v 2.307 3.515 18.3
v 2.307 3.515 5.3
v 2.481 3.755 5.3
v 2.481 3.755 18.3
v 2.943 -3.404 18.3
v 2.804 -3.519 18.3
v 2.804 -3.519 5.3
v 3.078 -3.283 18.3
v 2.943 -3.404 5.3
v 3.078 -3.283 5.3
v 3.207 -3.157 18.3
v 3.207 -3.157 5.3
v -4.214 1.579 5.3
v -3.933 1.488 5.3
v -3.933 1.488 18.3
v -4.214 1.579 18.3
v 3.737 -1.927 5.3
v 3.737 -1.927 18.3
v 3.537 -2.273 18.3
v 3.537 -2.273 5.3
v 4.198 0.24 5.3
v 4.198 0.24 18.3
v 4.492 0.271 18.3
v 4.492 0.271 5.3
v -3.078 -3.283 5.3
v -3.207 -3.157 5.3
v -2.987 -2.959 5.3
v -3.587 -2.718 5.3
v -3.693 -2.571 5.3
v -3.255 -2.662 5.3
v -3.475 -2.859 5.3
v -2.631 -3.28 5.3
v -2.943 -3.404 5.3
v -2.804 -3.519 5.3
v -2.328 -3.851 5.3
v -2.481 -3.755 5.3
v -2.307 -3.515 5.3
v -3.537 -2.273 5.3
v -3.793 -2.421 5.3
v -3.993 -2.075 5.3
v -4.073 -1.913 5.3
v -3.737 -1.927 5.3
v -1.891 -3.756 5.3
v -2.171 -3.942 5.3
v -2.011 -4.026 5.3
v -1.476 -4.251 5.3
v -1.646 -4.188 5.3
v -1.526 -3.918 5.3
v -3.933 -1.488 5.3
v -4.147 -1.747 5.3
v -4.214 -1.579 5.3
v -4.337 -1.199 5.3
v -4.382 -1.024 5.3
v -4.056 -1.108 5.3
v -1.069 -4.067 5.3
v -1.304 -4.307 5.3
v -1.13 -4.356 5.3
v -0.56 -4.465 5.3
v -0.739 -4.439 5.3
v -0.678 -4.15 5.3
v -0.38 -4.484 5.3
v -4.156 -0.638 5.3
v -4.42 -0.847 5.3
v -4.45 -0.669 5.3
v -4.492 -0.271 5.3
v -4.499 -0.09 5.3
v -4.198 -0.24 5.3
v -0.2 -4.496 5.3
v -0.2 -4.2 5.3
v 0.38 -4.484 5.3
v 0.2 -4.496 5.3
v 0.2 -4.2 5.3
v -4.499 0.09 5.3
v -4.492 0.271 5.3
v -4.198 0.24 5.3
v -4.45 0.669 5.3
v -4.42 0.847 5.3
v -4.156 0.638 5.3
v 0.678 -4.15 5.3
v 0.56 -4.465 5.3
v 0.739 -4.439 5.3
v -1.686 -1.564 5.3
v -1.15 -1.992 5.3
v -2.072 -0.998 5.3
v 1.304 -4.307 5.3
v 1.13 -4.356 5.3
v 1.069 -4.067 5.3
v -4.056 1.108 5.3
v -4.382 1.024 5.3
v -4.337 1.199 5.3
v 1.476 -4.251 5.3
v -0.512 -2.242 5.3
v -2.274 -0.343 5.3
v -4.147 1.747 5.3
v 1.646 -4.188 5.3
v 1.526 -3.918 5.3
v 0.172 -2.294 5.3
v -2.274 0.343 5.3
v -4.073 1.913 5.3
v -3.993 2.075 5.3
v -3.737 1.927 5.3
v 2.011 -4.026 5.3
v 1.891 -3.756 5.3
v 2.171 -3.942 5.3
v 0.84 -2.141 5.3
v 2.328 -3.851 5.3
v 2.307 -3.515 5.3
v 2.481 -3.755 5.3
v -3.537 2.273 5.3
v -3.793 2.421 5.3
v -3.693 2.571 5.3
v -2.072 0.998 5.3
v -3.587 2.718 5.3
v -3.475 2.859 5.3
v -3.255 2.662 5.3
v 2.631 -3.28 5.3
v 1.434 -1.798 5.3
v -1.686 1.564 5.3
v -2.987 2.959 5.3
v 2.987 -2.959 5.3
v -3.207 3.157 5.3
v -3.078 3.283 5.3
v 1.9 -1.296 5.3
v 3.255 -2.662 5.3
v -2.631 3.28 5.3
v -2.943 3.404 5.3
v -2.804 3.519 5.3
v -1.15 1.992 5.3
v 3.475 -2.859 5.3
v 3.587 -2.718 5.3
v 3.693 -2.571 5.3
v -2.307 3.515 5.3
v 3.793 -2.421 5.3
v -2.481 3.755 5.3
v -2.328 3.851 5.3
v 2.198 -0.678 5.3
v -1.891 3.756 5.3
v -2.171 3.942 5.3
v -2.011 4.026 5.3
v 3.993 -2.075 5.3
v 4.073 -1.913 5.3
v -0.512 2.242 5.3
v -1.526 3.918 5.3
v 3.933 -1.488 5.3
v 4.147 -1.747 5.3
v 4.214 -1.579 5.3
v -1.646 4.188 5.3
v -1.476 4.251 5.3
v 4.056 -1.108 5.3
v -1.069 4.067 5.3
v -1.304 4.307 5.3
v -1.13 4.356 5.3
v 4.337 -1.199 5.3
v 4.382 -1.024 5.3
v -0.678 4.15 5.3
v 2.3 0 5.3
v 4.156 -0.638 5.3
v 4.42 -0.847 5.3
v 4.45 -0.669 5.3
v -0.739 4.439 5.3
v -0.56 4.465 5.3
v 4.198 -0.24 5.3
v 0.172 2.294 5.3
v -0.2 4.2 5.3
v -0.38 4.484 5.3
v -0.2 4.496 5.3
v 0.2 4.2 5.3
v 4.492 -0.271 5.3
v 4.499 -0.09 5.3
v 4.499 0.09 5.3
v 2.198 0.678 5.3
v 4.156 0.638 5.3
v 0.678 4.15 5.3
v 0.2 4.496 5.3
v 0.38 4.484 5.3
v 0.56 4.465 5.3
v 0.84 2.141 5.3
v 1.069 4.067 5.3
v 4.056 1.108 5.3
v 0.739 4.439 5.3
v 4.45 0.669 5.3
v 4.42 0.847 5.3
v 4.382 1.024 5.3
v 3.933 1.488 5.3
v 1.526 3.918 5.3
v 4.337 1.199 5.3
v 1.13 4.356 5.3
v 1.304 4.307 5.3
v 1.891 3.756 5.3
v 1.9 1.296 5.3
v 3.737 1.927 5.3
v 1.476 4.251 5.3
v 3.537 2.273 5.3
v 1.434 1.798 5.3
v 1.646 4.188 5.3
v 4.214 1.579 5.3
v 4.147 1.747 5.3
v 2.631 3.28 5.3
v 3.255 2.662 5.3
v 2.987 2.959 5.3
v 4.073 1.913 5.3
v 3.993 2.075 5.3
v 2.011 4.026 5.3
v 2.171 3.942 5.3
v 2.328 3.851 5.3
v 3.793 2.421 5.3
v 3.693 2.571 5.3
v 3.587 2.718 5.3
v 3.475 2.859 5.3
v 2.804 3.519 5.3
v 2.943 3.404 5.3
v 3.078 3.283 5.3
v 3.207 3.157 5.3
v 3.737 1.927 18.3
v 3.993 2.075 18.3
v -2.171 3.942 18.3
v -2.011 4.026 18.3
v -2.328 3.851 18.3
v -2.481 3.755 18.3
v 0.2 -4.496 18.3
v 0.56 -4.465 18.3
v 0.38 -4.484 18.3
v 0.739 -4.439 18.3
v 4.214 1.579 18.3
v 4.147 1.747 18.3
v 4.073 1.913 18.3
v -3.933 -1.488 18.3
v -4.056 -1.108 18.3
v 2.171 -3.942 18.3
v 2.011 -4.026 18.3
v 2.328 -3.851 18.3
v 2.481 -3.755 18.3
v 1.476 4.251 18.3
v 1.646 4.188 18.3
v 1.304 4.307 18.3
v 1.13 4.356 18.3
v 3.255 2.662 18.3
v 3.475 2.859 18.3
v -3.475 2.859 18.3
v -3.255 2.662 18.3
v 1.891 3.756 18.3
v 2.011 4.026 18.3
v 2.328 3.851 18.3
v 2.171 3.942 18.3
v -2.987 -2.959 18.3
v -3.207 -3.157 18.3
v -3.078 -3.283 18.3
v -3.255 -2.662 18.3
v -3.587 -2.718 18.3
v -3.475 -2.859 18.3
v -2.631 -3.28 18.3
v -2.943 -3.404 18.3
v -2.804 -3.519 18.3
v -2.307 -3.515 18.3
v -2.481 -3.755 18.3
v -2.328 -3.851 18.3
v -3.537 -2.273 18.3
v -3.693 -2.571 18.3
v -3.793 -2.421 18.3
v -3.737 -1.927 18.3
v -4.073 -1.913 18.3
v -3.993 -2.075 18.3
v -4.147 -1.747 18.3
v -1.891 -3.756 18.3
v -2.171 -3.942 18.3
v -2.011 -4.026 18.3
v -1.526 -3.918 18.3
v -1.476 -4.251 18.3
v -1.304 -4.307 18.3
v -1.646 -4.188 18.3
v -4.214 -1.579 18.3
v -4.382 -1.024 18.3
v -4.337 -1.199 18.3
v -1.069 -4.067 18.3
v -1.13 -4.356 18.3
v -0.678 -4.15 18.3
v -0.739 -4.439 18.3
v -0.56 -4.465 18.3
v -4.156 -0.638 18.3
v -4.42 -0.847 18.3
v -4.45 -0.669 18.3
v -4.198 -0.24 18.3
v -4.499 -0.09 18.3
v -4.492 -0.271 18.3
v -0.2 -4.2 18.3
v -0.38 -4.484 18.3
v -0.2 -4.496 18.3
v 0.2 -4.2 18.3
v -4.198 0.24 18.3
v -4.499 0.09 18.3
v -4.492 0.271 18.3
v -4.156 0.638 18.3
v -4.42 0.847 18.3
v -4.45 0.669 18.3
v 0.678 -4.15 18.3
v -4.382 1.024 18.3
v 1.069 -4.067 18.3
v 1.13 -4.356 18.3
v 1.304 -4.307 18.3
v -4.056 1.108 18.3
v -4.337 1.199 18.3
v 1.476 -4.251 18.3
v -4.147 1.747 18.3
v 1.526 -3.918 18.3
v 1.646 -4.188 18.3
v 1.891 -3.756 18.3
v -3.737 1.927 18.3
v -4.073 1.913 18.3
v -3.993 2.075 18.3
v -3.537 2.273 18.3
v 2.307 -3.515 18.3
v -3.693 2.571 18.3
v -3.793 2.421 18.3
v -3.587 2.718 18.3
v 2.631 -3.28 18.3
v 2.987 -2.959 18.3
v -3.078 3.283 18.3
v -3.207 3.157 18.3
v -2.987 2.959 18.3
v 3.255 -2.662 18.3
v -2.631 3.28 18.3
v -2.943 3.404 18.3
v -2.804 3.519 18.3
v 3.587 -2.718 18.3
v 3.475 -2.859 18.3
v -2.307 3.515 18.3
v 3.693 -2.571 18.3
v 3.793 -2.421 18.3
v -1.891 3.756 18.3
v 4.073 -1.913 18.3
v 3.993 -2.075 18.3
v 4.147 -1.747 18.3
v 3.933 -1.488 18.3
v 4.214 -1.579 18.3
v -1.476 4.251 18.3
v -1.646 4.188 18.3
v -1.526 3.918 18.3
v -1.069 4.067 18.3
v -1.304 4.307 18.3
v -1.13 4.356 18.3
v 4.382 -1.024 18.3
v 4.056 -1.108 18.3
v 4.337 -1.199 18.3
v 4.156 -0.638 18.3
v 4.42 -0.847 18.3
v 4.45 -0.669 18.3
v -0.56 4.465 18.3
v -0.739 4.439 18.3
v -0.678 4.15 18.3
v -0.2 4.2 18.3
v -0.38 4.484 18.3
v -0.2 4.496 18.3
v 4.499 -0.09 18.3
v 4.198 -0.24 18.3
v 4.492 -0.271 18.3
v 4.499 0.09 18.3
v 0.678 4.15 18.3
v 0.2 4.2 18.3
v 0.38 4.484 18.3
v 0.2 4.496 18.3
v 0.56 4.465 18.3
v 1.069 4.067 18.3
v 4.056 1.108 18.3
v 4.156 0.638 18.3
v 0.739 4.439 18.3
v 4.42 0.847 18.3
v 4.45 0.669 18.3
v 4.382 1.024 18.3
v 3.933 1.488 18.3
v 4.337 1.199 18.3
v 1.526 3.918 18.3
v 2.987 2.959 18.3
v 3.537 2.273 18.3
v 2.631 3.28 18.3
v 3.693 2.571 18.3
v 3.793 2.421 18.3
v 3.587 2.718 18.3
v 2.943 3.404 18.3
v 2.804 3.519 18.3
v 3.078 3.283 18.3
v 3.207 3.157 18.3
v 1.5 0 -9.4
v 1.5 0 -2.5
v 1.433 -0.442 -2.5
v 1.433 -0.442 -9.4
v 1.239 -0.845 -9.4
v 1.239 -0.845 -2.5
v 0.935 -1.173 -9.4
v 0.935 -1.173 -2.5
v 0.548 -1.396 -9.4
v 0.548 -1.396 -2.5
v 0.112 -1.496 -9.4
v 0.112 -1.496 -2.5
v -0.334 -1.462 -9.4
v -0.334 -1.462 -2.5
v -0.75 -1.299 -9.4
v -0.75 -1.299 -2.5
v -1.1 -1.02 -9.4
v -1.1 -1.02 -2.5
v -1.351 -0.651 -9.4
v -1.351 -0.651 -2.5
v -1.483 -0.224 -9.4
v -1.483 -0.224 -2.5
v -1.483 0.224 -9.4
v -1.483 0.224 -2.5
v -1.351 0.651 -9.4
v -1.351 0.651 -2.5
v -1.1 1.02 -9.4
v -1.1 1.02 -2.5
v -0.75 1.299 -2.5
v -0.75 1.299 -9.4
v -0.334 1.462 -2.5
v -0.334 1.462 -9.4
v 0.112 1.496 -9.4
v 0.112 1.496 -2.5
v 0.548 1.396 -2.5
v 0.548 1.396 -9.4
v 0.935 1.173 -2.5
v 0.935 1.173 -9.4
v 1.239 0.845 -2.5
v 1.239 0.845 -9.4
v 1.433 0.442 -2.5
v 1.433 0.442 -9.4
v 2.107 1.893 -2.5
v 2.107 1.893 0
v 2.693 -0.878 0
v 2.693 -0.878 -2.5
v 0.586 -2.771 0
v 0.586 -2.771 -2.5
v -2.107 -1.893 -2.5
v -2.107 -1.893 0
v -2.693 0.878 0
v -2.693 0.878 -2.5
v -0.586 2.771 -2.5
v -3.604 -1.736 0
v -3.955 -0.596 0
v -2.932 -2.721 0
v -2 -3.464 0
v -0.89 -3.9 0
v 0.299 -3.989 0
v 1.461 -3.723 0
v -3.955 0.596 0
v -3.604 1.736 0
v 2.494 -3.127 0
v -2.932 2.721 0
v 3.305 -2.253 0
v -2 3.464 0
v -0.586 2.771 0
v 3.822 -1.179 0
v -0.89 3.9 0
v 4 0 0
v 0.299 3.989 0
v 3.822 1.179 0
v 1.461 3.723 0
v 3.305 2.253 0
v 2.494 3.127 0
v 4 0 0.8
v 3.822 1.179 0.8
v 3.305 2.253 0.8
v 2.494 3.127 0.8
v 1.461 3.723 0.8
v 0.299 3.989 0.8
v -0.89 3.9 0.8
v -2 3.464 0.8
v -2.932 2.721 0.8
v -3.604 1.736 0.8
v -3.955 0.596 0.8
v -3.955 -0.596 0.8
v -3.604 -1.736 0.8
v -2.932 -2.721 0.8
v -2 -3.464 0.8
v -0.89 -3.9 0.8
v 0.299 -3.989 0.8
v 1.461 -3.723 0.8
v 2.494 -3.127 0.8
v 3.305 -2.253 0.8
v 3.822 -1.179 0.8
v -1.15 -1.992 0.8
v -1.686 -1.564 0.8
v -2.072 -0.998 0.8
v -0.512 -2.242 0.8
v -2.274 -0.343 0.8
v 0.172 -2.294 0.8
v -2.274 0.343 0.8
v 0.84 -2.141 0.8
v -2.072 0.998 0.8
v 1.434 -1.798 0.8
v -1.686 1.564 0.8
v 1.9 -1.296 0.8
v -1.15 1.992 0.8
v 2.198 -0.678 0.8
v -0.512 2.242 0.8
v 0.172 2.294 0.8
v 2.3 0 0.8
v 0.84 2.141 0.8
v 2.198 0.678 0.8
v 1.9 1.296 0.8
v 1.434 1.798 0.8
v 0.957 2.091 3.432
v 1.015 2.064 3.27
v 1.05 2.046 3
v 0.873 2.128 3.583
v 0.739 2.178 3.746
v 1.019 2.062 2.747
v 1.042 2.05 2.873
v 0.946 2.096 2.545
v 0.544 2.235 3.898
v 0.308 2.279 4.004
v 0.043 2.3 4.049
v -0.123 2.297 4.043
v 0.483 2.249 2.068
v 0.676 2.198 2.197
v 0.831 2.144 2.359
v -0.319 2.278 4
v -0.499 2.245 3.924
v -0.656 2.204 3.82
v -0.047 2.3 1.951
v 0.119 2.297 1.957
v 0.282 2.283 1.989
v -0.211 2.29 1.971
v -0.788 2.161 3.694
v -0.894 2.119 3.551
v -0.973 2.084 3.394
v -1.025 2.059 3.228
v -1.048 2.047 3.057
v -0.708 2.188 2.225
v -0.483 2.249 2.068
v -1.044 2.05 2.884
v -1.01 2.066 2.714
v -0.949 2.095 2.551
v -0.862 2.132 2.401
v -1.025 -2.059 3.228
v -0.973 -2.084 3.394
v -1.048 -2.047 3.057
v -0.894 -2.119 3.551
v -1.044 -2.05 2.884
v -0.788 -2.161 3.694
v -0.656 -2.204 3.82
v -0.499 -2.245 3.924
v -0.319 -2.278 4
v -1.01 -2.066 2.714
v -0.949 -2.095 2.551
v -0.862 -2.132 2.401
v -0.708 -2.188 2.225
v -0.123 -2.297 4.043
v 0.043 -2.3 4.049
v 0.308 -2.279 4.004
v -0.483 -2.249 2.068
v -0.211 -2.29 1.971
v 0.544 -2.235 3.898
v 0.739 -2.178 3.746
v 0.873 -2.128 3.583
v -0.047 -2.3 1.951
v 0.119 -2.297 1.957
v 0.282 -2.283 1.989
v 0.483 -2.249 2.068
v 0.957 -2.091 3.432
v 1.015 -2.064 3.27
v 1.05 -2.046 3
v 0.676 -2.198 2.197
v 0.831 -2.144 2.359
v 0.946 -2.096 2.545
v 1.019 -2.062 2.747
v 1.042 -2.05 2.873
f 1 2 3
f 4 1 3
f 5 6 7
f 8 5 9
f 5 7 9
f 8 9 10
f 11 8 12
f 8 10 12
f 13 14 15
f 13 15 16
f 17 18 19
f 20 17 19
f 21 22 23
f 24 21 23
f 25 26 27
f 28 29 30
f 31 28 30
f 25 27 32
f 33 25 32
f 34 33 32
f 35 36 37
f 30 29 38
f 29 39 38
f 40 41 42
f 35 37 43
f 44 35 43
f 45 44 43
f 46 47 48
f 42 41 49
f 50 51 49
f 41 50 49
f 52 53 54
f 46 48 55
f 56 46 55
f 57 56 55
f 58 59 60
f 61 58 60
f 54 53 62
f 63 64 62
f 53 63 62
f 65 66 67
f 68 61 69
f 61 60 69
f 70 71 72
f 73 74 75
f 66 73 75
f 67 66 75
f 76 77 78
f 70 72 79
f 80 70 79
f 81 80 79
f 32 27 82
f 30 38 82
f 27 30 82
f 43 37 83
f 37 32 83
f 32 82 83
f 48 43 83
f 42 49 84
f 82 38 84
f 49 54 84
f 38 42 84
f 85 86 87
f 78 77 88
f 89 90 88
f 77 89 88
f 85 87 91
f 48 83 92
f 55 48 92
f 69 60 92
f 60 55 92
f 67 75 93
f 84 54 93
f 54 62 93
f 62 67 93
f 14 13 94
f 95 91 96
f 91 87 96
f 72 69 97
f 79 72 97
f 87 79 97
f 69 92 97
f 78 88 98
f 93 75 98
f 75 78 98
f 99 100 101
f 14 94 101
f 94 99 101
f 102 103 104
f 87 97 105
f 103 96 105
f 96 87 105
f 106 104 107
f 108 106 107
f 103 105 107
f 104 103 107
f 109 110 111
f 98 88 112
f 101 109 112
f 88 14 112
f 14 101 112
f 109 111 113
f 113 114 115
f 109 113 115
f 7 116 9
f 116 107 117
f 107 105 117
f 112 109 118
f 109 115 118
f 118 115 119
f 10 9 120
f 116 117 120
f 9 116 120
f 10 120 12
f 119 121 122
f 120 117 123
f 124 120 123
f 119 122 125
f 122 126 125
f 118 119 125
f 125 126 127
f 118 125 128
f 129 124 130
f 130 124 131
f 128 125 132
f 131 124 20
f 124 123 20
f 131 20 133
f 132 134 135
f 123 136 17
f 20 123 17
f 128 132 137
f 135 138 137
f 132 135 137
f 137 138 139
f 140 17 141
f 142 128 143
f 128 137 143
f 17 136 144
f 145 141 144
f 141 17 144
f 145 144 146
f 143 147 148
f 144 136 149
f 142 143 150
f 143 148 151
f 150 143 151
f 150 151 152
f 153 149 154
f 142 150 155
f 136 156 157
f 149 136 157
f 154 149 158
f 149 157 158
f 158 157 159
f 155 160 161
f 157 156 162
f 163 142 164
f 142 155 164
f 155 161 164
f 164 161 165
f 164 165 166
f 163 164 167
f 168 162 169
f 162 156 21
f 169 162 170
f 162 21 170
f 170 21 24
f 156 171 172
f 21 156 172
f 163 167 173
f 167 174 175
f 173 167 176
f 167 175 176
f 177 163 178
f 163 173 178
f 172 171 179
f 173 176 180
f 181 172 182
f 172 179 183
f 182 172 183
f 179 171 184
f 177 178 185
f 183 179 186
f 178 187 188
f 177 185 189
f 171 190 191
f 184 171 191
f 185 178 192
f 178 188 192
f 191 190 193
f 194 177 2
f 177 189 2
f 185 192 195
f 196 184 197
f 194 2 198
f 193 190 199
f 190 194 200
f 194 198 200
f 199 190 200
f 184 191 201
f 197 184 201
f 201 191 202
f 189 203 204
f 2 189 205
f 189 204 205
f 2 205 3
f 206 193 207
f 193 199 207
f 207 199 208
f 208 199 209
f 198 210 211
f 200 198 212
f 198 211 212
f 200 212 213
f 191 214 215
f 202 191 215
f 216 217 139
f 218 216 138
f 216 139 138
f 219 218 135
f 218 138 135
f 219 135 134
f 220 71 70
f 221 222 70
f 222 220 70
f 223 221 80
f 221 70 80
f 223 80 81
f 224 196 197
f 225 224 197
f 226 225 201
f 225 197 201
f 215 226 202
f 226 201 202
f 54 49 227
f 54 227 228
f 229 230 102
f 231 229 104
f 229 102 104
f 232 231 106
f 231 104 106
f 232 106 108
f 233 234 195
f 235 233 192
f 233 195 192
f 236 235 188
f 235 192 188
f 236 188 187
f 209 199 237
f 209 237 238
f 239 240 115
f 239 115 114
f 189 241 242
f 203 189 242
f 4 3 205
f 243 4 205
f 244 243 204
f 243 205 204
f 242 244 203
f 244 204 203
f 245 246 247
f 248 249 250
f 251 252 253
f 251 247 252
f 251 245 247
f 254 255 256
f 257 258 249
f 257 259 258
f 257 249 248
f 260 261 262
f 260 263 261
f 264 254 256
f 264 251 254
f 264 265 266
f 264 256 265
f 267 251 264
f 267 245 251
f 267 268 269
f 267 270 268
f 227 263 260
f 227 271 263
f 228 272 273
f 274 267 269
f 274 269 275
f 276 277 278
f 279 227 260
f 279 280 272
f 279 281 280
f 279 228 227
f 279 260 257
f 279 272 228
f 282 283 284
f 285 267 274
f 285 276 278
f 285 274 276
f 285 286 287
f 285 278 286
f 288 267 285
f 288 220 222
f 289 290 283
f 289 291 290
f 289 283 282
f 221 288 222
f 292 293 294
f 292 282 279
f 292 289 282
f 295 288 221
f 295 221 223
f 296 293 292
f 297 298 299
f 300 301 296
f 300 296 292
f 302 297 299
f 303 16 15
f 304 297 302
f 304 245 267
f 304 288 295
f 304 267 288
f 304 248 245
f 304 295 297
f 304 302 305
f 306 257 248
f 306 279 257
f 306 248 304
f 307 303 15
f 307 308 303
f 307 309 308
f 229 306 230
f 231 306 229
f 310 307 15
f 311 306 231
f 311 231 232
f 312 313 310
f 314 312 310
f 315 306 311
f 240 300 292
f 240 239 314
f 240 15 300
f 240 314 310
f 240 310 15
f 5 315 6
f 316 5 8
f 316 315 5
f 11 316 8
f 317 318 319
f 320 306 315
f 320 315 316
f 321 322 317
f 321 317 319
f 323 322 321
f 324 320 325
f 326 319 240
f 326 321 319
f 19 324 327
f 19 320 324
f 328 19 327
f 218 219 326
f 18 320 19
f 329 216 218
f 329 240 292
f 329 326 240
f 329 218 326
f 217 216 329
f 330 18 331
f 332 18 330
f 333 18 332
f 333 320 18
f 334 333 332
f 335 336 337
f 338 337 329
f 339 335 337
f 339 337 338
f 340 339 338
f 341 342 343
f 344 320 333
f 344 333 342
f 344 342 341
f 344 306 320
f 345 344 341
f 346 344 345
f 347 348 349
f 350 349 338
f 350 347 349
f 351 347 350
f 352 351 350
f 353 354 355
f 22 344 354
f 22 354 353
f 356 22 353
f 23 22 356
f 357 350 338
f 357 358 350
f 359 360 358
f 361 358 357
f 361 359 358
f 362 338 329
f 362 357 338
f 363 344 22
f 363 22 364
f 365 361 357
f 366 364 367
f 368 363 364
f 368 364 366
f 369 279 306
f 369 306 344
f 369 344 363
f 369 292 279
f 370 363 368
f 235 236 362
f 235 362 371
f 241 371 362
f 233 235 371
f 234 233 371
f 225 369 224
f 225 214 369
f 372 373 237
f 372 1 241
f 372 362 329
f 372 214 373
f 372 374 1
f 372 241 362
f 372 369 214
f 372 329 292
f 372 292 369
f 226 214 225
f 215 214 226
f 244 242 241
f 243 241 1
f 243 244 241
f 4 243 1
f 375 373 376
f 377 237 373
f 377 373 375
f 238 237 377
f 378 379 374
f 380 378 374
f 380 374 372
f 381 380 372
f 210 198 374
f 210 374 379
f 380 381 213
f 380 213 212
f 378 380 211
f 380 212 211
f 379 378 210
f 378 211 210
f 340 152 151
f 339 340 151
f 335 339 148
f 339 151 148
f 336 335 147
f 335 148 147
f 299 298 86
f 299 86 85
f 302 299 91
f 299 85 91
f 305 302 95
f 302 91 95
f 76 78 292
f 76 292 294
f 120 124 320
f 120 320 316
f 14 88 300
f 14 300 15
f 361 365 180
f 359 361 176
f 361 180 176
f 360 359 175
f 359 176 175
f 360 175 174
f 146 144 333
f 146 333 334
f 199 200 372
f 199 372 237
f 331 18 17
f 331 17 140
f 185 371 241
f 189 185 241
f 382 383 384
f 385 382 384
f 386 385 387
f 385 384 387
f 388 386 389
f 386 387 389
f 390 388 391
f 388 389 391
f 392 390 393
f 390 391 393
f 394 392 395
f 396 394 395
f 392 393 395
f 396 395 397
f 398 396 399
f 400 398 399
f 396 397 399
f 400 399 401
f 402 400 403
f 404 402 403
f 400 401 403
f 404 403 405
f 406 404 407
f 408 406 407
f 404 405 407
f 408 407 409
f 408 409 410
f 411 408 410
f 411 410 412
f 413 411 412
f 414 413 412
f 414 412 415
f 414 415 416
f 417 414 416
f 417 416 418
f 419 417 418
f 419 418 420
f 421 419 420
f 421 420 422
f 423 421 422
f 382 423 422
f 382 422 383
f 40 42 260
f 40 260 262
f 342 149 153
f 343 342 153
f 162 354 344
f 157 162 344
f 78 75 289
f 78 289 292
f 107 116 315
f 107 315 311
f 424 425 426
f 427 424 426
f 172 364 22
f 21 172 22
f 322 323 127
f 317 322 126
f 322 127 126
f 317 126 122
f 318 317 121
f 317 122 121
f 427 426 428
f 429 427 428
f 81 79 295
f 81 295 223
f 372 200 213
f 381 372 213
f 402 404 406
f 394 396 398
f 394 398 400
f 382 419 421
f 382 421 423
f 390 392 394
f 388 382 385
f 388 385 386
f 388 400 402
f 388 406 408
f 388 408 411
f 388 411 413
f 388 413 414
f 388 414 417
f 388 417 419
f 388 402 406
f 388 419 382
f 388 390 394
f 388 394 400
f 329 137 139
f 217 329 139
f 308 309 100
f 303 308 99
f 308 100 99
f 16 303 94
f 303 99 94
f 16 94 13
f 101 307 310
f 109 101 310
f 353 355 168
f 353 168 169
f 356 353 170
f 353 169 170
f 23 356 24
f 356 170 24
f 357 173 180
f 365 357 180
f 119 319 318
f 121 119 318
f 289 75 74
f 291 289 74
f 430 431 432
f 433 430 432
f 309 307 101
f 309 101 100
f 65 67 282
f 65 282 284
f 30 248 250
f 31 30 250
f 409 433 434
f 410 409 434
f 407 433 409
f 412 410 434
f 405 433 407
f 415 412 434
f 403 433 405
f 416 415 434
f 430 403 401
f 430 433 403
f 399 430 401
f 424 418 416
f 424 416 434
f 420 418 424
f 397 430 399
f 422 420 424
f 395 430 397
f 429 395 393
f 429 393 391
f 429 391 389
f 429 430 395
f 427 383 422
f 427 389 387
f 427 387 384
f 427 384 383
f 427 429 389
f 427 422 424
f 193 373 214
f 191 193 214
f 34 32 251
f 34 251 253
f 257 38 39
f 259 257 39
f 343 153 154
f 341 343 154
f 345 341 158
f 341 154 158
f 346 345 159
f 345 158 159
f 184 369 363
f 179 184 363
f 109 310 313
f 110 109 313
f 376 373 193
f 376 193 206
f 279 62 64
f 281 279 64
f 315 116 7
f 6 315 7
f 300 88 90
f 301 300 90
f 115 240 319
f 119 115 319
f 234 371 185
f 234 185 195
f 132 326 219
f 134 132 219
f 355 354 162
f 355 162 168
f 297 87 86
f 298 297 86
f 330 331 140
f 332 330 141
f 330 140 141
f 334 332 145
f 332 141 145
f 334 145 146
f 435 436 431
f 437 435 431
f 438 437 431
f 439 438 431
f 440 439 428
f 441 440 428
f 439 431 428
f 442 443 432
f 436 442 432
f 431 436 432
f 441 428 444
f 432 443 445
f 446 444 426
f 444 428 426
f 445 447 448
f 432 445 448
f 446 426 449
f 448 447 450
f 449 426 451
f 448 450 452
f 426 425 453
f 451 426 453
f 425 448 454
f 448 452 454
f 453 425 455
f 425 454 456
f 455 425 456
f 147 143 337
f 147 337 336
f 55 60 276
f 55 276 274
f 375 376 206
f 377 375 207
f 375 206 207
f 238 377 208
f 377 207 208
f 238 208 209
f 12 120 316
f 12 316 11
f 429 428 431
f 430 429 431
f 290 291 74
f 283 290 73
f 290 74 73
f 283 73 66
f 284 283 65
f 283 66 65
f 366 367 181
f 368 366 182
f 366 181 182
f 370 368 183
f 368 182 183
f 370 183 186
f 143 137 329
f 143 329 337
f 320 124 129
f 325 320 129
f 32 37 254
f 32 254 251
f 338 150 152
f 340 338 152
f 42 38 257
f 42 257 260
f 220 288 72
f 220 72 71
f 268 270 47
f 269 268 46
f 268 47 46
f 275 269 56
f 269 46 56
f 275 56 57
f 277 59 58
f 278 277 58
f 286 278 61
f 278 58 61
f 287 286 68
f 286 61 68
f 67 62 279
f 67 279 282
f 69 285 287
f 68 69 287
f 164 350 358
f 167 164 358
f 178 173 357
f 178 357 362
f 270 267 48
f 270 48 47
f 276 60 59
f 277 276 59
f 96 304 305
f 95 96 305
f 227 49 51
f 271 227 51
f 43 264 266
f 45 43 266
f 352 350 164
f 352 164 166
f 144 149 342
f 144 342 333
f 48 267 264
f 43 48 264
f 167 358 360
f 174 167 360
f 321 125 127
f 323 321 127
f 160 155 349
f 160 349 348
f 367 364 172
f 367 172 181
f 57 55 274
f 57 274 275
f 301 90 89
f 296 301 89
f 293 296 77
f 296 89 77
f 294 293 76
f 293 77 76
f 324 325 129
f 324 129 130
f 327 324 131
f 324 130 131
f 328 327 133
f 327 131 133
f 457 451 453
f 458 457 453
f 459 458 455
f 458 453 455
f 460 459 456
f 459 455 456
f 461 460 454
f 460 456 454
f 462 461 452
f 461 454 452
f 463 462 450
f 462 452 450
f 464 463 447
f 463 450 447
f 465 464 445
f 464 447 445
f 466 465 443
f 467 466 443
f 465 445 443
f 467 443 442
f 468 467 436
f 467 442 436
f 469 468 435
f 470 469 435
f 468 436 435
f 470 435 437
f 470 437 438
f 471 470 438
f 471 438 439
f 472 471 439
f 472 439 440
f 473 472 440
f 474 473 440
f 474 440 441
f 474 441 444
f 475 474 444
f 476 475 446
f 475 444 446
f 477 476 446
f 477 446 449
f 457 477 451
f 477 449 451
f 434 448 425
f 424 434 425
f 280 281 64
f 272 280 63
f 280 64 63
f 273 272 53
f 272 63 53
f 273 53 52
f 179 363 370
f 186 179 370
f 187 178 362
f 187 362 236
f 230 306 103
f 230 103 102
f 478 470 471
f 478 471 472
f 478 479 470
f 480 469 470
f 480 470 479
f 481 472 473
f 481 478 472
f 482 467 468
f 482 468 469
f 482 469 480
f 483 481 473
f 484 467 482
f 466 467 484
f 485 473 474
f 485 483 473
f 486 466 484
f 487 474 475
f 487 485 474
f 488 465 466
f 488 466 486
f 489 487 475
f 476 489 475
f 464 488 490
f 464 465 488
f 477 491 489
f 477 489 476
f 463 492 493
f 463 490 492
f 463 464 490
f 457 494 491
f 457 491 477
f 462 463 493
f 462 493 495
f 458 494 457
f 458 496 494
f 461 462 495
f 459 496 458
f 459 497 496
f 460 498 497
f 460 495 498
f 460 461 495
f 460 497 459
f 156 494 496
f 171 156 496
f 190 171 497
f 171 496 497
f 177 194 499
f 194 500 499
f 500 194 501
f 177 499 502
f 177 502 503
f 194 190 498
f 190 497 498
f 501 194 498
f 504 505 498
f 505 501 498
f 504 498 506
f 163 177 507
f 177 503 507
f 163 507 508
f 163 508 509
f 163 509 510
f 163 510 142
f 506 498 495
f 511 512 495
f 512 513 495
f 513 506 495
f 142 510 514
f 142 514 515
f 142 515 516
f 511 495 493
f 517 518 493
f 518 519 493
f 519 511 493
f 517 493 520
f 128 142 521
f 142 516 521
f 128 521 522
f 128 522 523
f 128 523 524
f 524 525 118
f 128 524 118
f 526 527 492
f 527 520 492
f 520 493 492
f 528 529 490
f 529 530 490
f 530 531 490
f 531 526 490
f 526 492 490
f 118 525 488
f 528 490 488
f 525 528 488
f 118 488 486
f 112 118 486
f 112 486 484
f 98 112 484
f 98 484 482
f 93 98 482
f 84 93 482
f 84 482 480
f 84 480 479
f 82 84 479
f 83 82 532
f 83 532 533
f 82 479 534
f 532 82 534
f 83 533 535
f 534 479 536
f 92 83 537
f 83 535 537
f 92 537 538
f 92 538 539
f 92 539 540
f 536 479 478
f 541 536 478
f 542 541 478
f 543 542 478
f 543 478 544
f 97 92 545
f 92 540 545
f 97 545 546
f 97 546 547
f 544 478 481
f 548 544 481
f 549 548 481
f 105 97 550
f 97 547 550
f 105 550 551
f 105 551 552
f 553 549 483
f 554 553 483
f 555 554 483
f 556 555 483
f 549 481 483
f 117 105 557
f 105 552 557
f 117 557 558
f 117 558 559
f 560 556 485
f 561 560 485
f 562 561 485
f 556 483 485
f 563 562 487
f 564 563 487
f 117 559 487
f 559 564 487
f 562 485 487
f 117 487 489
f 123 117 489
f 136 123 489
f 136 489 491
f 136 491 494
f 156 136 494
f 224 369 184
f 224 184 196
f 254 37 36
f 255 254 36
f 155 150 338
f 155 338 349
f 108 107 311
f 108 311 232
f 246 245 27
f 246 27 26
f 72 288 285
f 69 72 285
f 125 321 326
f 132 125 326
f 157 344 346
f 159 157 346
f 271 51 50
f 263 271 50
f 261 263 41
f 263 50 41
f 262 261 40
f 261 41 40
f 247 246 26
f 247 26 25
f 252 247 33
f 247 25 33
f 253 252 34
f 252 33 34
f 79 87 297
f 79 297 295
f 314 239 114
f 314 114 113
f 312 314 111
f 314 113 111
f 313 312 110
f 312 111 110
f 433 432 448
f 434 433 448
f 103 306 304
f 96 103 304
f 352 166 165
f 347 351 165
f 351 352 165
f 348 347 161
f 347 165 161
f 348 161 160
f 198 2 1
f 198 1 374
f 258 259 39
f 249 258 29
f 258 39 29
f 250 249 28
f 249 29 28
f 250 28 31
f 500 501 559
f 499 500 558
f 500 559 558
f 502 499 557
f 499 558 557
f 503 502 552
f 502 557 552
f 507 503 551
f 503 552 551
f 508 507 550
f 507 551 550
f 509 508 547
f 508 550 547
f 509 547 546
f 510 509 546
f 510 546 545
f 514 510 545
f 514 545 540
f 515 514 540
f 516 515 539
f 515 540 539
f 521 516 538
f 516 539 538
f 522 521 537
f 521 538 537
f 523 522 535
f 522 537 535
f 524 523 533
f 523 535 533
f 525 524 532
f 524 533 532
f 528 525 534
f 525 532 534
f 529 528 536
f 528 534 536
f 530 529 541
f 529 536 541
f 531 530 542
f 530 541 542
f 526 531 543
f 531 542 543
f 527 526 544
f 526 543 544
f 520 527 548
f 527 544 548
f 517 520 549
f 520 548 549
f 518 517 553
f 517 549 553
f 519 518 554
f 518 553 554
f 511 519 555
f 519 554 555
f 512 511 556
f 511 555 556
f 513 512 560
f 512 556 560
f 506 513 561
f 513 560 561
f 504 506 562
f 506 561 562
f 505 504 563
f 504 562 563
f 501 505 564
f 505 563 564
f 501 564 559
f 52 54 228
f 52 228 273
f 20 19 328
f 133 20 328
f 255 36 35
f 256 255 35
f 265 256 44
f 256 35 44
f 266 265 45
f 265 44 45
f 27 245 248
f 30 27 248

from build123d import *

# Parameters (mm, degrees)
F0_R      = 4
F1_DEPTH  = 0.8
F2_R      = 2.3
F3_DEPTH  = 4.5
F4_R      = 4.5
F5_DEPTH  = 13
F6_R      = 1.5
F7_DEPTH  = 9.4
F8_R      = 1.05
F9_DEPTH  = 12.5
F10_W     = 0.4
F10_H     = 0.6
F11_DEPTH = 25
F12_COUNT = 30
F15_DEPTH = 2.5


with BuildPart() as f1:
    # F0 (on Top) → F1 (new body)
    with BuildSketch(Plane.XY):
        Circle(F0_R)
    extrude(amount=F1_DEPTH)

    # F2 (on face) → F3 (join)
    with BuildSketch(Plane.XY.offset(0.8)):
        Circle(F2_R)
    extrude(amount=F3_DEPTH)

    # F4 (on face) → F5 (join)
    with BuildSketch(Plane.XY.offset(5.3)):
        Circle(F4_R)
    extrude(amount=F5_DEPTH)

    # F6 (on face) → F7 (join)
    with BuildSketch(Plane(origin=(0, 0, 0), x_dir=(1, 0, 0), z_dir=(0, 0, -1))):
        Circle(F6_R)
    extrude(amount=F7_DEPTH)

    # F8 (on Front) → F9 (cut, symmetric)
    with BuildSketch(Plane.XZ):
        with Locations((0, 3)):
            Circle(F8_R)
    extrude(amount=F9_DEPTH, both=True, mode=Mode.SUBTRACT)


with BuildPart() as f11:
    # F10 (on face) → F11 (new body)
    with BuildSketch(Plane.XY.offset(18.3)):
        with Locations((0, 4.5)):
            Rectangle(F10_W, F10_H)
    extrude(amount=-F11_DEPTH)


with BuildPart() as f12_1:
    # F12: instance of F11
    add(f11.part.rotate(Axis((0, 0, 18.3), (0, 0, 1)), 1 * 360 / F12_COUNT))


with BuildPart() as f12_2:
    # F12: instance of F11
    add(f11.part.rotate(Axis((0, 0, 18.3), (0, 0, 1)), 2 * 360 / F12_COUNT))


with BuildPart() as f12_3:
    # F12: instance of F11
    add(f11.part.rotate(Axis((0, 0, 18.3), (0, 0, 1)), 3 * 360 / F12_COUNT))


with BuildPart() as f12_4:
    # F12: instance of F11
    add(f11.part.rotate(Axis((0, 0, 18.3), (0, 0, 1)), 4 * 360 / F12_COUNT))


with BuildPart() as f12_5:
    # F12: instance of F11
    add(f11.part.rotate(Axis((0, 0, 18.3), (0, 0, 1)), 5 * 360 / F12_COUNT))


with BuildPart() as f12_6:
    # F12: instance of F11
    add(f11.part.rotate(Axis((0, 0, 18.3), (0, 0, 1)), 6 * 360 / F12_COUNT))


with BuildPart() as f12_7:
    # F12: instance of F11
    add(f11.part.rotate(Axis((0, 0, 18.3), (0, 0, 1)), 7 * 360 / F12_COUNT))


with BuildPart() as f12_8:
    # F12: instance of F11
    add(f11.part.rotate(Axis((0, 0, 18.3), (0, 0, 1)), 8 * 360 / F12_COUNT))


with BuildPart() as f12_9:
    # F12: instance of F11
    add(f11.part.rotate(Axis((0, 0, 18.3), (0, 0, 1)), 9 * 360 / F12_COUNT))


with BuildPart() as f12_10:
    # F12: instance of F11
    add(f11.part.rotate(Axis((0, 0, 18.3), (0, 0, 1)), 10 * 360 / F12_COUNT))


with BuildPart() as f12_11:
    # F12: instance of F11
    add(f11.part.rotate(Axis((0, 0, 18.3), (0, 0, 1)), 11 * 360 / F12_COUNT))


with BuildPart() as f12_12:
    # F12: instance of F11
    add(f11.part.rotate(Axis((0, 0, 18.3), (0, 0, 1)), 12 * 360 / F12_COUNT))


with BuildPart() as f12_13:
    # F12: instance of F11
    add(f11.part.rotate(Axis((0, 0, 18.3), (0, 0, 1)), 13 * 360 / F12_COUNT))


with BuildPart() as f12_14:
    # F12: instance of F11
    add(f11.part.rotate(Axis((0, 0, 18.3), (0, 0, 1)), 14 * 360 / F12_COUNT))


with BuildPart() as f12_15:
    # F12: instance of F11
    add(f11.part.rotate(Axis((0, 0, 18.3), (0, 0, 1)), 15 * 360 / F12_COUNT))


with BuildPart() as f12_16:
    # F12: instance of F11
    add(f11.part.rotate(Axis((0, 0, 18.3), (0, 0, 1)), 16 * 360 / F12_COUNT))


with BuildPart() as f12_17:
    # F12: instance of F11
    add(f11.part.rotate(Axis((0, 0, 18.3), (0, 0, 1)), 17 * 360 / F12_COUNT))


with BuildPart() as f12_18:
    # F12: instance of F11
    add(f11.part.rotate(Axis((0, 0, 18.3), (0, 0, 1)), 18 * 360 / F12_COUNT))


with BuildPart() as f12_19:
    # F12: instance of F11
    add(f11.part.rotate(Axis((0, 0, 18.3), (0, 0, 1)), 19 * 360 / F12_COUNT))


with BuildPart() as f12_20:
    # F12: instance of F11
    add(f11.part.rotate(Axis((0, 0, 18.3), (0, 0, 1)), 20 * 360 / F12_COUNT))


with BuildPart() as f12_21:
    # F12: instance of F11
    add(f11.part.rotate(Axis((0, 0, 18.3), (0, 0, 1)), 21 * 360 / F12_COUNT))


with BuildPart() as f12_22:
    # F12: instance of F11
    add(f11.part.rotate(Axis((0, 0, 18.3), (0, 0, 1)), 22 * 360 / F12_COUNT))


with BuildPart() as f12_23:
    # F12: instance of F11
    add(f11.part.rotate(Axis((0, 0, 18.3), (0, 0, 1)), 23 * 360 / F12_COUNT))


with BuildPart() as f12_24:
    # F12: instance of F11
    add(f11.part.rotate(Axis((0, 0, 18.3), (0, 0, 1)), 24 * 360 / F12_COUNT))


with BuildPart() as f12_25:
    # F12: instance of F11
    add(f11.part.rotate(Axis((0, 0, 18.3), (0, 0, 1)), 25 * 360 / F12_COUNT))


with BuildPart() as f12_26:
    # F12: instance of F11
    add(f11.part.rotate(Axis((0, 0, 18.3), (0, 0, 1)), 26 * 360 / F12_COUNT))


with BuildPart() as f12_27:
    # F12: instance of F11
    add(f11.part.rotate(Axis((0, 0, 18.3), (0, 0, 1)), 27 * 360 / F12_COUNT))


with BuildPart() as f12_28:
    # F12: instance of F11
    add(f11.part.rotate(Axis((0, 0, 18.3), (0, 0, 1)), 28 * 360 / F12_COUNT))


with BuildPart() as f12_29:
    # F12: instance of F11
    add(f11.part.rotate(Axis((0, 0, 18.3), (0, 0, 1)), 29 * 360 / F12_COUNT))


with BuildPart() as f1_1:
    add(f1.part)

    # F13: cut F12_1, F12_2, F12_3, F12_4, F12_5, F12_6, F12_7, F12_8, F12_9, F12_10, F12_11, F12_12, F12_13, F12_14, F12_15, F12_16, F12_17, F12_18, F12_19, F12_20, F12_21, F12_22, F12_23, F12_24, F12_25, F12_26, F12_27, F12_28, F12_29, F11
    add(f12_1.part, mode=Mode.SUBTRACT)
    add(f12_2.part, mode=Mode.SUBTRACT)
    add(f12_3.part, mode=Mode.SUBTRACT)
    add(f12_4.part, mode=Mode.SUBTRACT)
    add(f12_5.part, mode=Mode.SUBTRACT)
    add(f12_6.part, mode=Mode.SUBTRACT)
    add(f12_7.part, mode=Mode.SUBTRACT)
    add(f12_8.part, mode=Mode.SUBTRACT)
    add(f12_9.part, mode=Mode.SUBTRACT)
    add(f12_10.part, mode=Mode.SUBTRACT)
    add(f12_11.part, mode=Mode.SUBTRACT)
    add(f12_12.part, mode=Mode.SUBTRACT)
    add(f12_13.part, mode=Mode.SUBTRACT)
    add(f12_14.part, mode=Mode.SUBTRACT)
    add(f12_15.part, mode=Mode.SUBTRACT)
    add(f12_16.part, mode=Mode.SUBTRACT)
    add(f12_17.part, mode=Mode.SUBTRACT)
    add(f12_18.part, mode=Mode.SUBTRACT)
    add(f12_19.part, mode=Mode.SUBTRACT)
    add(f12_20.part, mode=Mode.SUBTRACT)
    add(f12_21.part, mode=Mode.SUBTRACT)
    add(f12_22.part, mode=Mode.SUBTRACT)
    add(f12_23.part, mode=Mode.SUBTRACT)
    add(f12_24.part, mode=Mode.SUBTRACT)
    add(f12_25.part, mode=Mode.SUBTRACT)
    add(f12_26.part, mode=Mode.SUBTRACT)
    add(f12_27.part, mode=Mode.SUBTRACT)
    add(f12_28.part, mode=Mode.SUBTRACT)
    add(f12_29.part, mode=Mode.SUBTRACT)
    add(f11.part, mode=Mode.SUBTRACT)

    # F14 (on face) → F15 (join)
    with BuildSketch(Plane(origin=(0, 0, 0), x_dir=(1, 0, 0), z_dir=(0, 0, -1))):
        Polygon((-2.6927305179, -0.8780481684), (-0.5859532394, -2.7709971182), (2.1067772785, -1.8929489498), (2.6927305179, 0.8780481684), (0.5859532394, 2.7709971182), (-2.1067772785, 1.8929489498), align=None)
    extrude(amount=F15_DEPTH)


solid = f1_1.part
